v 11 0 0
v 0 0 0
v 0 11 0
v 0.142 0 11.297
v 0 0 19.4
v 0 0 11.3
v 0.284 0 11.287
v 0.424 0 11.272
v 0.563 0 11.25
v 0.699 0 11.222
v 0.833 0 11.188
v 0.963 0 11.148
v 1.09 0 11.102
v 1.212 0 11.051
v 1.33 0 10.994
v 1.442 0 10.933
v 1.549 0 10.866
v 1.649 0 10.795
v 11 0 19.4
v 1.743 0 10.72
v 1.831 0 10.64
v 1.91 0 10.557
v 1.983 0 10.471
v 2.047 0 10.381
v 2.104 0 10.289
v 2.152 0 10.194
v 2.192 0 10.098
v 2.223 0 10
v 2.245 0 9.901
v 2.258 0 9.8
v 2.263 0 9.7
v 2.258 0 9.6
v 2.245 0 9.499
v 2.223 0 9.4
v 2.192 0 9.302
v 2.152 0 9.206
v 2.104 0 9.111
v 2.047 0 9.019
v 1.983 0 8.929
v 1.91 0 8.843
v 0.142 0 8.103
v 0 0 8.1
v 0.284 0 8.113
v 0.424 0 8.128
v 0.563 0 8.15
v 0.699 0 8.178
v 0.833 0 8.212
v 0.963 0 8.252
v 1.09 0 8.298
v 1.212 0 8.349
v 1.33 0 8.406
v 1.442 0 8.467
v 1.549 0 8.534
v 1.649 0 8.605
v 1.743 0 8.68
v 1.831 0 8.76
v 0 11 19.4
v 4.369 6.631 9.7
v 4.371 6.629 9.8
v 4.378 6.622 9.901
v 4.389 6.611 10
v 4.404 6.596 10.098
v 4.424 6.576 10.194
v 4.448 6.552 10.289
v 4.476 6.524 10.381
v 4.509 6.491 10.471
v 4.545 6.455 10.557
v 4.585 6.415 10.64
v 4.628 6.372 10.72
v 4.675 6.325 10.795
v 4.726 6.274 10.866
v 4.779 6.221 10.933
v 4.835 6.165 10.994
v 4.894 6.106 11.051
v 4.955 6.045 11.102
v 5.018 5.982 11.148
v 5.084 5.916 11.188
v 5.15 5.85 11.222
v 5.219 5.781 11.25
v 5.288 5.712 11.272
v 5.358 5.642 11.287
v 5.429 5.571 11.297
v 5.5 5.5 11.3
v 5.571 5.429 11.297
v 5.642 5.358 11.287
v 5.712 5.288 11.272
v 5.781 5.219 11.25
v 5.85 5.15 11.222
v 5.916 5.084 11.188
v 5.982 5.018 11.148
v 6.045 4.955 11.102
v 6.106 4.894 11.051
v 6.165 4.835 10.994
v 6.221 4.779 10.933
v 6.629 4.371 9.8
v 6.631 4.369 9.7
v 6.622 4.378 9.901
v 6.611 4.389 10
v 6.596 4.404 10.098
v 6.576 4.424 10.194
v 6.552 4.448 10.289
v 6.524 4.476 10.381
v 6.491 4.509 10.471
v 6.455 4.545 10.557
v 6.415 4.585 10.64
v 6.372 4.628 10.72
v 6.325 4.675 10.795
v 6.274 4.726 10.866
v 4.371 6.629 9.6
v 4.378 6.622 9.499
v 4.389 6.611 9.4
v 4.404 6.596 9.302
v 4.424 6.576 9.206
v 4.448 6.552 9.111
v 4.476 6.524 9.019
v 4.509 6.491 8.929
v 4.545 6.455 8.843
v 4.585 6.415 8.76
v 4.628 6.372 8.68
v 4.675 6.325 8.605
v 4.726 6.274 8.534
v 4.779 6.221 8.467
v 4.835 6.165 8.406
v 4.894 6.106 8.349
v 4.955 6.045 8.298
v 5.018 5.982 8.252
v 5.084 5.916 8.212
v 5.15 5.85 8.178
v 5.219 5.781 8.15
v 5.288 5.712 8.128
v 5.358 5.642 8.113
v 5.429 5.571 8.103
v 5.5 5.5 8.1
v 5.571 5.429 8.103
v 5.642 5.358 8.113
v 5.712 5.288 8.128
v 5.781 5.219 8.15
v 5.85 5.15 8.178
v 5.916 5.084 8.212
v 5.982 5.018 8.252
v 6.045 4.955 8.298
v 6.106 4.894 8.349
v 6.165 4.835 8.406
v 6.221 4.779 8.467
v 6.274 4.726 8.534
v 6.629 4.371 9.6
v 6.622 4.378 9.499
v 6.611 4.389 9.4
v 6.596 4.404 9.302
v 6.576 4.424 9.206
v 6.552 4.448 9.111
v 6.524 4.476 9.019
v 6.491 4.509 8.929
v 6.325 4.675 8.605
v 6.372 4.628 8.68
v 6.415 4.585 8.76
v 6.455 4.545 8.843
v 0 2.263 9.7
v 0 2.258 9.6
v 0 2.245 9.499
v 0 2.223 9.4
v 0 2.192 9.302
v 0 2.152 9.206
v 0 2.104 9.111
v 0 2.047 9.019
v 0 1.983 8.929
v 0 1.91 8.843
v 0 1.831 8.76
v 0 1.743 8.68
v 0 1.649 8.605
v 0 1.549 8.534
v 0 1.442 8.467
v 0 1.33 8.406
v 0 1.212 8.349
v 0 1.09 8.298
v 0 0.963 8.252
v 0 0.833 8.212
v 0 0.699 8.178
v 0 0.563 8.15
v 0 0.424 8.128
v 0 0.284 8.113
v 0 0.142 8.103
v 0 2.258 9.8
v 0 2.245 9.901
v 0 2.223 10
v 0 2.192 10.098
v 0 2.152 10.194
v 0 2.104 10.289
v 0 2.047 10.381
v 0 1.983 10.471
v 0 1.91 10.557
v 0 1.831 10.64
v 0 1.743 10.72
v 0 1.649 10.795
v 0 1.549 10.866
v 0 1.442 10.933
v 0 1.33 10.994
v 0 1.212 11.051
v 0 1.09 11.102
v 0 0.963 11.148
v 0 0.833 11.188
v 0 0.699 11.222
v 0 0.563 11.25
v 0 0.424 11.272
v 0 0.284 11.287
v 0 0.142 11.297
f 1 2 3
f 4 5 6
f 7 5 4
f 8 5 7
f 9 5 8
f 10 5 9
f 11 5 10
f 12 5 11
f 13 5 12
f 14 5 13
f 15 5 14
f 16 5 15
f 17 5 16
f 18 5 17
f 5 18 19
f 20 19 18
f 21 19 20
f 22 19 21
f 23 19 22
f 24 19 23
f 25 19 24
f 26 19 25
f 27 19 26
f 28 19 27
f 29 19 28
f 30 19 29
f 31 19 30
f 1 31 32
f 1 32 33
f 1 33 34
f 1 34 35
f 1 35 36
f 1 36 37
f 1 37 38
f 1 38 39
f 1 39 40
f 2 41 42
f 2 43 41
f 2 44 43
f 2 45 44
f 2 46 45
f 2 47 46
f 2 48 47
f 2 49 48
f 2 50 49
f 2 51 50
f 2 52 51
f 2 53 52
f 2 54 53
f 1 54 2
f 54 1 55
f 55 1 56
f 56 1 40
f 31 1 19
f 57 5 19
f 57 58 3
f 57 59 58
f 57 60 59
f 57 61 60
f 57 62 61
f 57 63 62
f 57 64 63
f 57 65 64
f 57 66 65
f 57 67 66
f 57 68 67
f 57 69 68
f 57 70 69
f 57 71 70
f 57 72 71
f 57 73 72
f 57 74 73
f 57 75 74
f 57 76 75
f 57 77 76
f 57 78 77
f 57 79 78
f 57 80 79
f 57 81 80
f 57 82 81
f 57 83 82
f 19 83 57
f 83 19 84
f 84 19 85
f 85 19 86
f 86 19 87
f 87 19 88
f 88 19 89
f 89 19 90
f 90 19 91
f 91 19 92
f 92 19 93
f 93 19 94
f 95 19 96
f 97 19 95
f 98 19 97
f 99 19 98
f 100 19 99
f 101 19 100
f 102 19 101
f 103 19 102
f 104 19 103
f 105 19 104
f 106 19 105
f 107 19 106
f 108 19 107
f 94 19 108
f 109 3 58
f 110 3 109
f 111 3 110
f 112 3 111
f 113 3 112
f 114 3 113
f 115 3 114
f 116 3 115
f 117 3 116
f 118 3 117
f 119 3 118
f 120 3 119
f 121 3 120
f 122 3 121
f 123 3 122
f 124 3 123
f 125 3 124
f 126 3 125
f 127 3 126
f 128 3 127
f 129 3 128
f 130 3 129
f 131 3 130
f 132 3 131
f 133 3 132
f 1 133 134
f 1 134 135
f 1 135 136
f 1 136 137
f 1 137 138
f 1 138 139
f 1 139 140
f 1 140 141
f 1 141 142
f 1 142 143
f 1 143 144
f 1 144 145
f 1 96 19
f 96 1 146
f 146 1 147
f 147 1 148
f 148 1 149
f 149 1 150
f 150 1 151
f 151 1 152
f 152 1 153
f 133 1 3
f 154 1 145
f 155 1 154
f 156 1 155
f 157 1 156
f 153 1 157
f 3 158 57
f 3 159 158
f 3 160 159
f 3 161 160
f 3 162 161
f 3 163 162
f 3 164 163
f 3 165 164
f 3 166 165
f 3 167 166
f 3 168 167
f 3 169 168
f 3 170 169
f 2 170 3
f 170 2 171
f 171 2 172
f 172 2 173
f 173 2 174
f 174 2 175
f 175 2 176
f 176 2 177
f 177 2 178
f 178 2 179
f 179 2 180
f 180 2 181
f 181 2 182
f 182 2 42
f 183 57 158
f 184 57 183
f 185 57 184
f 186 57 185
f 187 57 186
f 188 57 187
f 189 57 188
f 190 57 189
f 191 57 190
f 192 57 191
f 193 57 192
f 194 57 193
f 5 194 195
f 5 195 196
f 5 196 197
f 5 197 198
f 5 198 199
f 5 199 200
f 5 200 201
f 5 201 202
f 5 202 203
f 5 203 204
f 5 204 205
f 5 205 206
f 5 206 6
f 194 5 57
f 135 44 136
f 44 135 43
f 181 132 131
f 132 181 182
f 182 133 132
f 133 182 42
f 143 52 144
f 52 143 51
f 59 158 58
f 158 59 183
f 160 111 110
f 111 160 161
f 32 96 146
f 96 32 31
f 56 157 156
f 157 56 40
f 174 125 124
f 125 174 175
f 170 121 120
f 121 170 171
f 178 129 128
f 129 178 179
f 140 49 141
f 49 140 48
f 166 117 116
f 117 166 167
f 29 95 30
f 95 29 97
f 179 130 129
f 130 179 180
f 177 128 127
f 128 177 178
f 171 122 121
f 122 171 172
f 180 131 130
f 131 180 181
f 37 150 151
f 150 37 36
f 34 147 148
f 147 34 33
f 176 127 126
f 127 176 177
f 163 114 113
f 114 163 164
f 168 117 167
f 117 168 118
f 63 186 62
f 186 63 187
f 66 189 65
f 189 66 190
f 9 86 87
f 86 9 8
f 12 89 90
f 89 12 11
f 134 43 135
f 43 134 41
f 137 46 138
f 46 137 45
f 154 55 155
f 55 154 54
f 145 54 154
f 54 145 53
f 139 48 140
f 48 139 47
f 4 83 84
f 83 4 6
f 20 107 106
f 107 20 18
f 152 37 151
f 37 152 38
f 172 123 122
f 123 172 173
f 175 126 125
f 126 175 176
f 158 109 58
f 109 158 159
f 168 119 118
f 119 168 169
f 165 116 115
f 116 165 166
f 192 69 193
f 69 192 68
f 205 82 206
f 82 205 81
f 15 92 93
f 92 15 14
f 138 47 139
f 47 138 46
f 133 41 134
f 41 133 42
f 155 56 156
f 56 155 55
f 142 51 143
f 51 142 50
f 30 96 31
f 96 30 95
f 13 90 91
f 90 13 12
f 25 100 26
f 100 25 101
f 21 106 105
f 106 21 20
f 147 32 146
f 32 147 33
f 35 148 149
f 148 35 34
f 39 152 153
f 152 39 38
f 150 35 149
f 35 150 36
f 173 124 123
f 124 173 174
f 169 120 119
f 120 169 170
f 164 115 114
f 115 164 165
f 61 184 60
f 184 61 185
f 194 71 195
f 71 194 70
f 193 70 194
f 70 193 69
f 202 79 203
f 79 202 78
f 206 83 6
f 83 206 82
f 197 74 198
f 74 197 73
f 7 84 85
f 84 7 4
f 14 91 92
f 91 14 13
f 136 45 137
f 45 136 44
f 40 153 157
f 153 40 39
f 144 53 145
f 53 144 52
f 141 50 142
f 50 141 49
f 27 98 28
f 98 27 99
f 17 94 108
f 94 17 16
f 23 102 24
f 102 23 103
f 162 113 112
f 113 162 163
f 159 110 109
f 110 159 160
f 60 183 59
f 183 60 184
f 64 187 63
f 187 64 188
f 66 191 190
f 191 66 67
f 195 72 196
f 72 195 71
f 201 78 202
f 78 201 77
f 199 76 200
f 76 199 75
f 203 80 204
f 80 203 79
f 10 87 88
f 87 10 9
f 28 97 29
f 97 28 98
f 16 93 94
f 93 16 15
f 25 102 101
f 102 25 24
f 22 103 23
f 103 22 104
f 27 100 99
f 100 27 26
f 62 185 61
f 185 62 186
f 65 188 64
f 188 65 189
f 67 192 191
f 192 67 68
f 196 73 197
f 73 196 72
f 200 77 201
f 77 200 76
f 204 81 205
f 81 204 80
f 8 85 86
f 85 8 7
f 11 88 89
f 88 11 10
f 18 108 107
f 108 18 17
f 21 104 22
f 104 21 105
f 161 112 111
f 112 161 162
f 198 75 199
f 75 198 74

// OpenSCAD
// Parameters
short_edge = 11;              // legs of the right triangle
prism_height = 19.4;          // extrusion height
cyl_d = 3.2;
cyl_r = cyl_d / 2;

// Module to create the right triangle in 2D
module right_triangle_2d() {
    polygon(points=[
        [0, 0],
        [short_edge, 0],
        [0, short_edge]
    ]);
}

// Module for the triangle prism
module triangle_prism() {
    linear_extrude(height=prism_height)
        right_triangle_2d();
}

// Calculate the center point of the hypotenuse
hypotenuse_center = [short_edge/2, short_edge/2, prism_height/2];

// Correct rotation:
// - First rotate around Z by 45° to align with hypotenuse
// - Then rotate around the new X-axis by 90° to go perpendicular into the face
module hypotenuse_cylinder() {
   translate(hypotenuse_center)
        rotate([0, 90, 45])  // Z=45 to align with hypotenuse, Y=-45 to tilt perpendicular
            cylinder(h=90, r=cyl_r, $fn=100, center=true); // Long enough to cut through
}

// Final shape: triangle prism minus cylinder
difference() {
    triangle_prism();
    hypotenuse_cylinder();
}
